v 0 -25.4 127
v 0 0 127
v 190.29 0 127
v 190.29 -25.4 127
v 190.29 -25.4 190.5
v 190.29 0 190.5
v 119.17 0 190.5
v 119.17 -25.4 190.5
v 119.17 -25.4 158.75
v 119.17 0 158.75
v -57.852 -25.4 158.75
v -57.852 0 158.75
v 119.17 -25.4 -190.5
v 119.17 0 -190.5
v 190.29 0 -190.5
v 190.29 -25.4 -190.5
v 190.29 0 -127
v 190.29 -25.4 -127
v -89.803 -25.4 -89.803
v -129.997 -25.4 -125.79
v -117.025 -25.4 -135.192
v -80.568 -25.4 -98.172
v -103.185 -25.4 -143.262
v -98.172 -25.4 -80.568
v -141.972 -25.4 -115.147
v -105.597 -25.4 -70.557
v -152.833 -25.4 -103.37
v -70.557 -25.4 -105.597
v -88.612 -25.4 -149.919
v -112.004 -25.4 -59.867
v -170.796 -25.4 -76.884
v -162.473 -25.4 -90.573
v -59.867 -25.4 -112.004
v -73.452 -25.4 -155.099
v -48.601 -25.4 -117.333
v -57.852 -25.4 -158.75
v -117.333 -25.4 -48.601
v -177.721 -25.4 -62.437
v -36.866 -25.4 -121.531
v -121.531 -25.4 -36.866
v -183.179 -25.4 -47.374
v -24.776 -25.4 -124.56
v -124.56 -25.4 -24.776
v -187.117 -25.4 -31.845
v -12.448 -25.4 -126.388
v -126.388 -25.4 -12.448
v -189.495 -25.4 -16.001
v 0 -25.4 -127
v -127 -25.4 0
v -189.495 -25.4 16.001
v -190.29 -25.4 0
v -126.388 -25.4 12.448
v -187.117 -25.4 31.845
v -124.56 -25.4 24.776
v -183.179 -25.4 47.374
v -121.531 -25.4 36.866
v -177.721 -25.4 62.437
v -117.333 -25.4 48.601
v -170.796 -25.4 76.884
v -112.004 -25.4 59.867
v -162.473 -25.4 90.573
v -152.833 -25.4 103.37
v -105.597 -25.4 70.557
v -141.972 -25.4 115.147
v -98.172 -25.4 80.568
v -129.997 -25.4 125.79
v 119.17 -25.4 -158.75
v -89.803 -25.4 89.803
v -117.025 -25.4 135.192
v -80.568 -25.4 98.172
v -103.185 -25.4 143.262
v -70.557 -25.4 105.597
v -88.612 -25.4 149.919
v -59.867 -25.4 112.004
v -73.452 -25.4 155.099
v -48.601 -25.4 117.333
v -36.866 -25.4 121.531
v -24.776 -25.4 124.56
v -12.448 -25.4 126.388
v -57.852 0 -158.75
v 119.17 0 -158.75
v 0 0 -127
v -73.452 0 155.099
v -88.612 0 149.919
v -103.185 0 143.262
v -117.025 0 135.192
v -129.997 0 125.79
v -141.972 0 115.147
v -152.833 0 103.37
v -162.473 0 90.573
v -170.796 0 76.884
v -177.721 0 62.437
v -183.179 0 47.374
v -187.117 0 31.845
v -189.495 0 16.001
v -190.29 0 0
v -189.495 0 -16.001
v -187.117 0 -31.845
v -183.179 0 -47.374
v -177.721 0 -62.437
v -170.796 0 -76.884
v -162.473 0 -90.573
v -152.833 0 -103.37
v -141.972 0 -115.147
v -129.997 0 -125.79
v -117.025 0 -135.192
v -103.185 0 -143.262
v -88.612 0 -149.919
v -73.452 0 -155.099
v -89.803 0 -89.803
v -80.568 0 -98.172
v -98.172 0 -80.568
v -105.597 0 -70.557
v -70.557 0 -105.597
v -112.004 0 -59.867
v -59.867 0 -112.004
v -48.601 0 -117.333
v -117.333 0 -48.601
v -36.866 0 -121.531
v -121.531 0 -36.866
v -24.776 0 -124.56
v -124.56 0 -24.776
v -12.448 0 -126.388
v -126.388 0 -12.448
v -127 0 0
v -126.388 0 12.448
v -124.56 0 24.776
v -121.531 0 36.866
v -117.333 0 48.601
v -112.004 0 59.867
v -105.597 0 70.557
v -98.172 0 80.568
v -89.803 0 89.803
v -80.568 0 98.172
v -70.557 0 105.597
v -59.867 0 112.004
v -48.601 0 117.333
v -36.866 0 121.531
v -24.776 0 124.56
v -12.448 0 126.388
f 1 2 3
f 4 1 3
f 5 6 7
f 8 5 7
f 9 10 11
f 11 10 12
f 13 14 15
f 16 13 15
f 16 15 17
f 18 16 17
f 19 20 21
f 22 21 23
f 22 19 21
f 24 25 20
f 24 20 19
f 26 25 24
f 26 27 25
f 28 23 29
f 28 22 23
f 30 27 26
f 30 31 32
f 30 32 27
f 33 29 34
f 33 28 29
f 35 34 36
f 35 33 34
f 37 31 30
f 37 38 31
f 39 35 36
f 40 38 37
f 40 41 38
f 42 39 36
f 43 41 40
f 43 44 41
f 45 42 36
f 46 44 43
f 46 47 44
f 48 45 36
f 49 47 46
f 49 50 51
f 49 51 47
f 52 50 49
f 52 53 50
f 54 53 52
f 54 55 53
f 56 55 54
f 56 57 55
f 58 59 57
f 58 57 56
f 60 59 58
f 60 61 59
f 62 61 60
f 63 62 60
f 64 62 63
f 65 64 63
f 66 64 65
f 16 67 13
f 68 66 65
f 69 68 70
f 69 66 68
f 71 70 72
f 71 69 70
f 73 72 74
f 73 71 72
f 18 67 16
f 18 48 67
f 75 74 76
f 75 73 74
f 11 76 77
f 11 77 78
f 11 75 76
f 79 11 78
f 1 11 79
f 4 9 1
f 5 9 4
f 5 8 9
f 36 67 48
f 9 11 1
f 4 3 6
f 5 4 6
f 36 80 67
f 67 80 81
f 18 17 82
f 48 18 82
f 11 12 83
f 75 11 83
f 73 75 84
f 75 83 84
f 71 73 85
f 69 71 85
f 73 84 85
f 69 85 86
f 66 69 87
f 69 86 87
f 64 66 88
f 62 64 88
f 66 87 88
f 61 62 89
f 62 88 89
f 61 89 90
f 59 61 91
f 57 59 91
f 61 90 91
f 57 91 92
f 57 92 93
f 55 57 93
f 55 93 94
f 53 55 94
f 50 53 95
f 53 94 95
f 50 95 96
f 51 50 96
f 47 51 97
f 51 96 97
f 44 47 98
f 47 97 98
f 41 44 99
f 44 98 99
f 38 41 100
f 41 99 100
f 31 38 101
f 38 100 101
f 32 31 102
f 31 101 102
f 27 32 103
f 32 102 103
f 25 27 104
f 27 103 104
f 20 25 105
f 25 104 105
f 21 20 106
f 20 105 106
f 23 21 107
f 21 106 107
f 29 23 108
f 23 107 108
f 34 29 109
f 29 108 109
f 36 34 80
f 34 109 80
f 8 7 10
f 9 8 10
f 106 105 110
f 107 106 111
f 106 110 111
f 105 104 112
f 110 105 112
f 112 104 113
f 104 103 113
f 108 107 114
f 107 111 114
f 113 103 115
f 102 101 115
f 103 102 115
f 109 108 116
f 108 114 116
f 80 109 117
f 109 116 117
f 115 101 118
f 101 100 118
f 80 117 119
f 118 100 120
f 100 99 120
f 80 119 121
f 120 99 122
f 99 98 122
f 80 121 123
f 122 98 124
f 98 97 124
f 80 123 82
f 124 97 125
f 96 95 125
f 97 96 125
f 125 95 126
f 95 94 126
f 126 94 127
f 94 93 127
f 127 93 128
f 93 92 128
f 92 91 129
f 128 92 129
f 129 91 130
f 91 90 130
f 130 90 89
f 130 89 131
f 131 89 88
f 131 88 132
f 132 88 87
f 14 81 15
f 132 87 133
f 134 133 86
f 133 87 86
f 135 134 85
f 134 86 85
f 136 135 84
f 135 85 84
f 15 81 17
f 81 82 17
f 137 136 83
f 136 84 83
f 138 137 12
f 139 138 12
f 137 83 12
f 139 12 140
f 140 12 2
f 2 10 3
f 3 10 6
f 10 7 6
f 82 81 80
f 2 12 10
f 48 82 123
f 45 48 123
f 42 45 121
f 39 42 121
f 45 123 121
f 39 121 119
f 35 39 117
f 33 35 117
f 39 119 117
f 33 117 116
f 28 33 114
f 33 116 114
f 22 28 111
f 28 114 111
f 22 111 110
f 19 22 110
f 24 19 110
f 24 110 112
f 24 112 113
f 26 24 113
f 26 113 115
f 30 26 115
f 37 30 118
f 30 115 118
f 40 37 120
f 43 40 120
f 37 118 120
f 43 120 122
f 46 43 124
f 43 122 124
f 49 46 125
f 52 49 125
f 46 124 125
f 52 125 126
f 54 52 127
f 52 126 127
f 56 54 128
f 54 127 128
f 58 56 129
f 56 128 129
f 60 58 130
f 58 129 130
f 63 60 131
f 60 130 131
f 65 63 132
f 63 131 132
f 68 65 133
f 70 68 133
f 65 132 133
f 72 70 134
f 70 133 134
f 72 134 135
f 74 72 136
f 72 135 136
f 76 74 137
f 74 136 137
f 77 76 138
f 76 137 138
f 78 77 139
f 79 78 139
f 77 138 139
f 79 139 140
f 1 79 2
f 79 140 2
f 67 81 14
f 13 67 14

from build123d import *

# Parameters (mm, degrees)
F1_DEPTH = 25.4


with BuildPart() as f1:
    # F0 (on Front) → F1 (new body)
    with BuildSketch(Plane.XZ):
        with BuildLine():
            Line((-57.852422, -158.75), (119.170049, -158.75))
            Line((119.170049, -158.75), (119.170049, -190.5))
            Line((119.170049, -190.5), (190.290049, -190.5))
            Line((190.290049, -190.5), (190.290049, -158.75))
            Line((190.290049, -158.75), (190.290049, -127))
            Line((190.290049, -127), (0, -127))
            ThreePointArc((0, -127), (-127, 0), (0, 127))
            Line((0, 127), (153.091423, 127))
            Line((153.091423, 127), (190.290049, 127))
            Line((190.290049, 127), (190.290049, 158.75))
            Line((190.290049, 158.75), (190.290049, 190.5))
            Line((190.290049, 190.5), (119.170049, 190.5))
            Line((119.170049, 190.5), (119.170049, 158.75))
            Line((119.170049, 158.75), (-57.852422, 158.75))
            ThreePointArc((-57.852422, 158.75), (-190.290049, 0), (-57.852422, -158.75))
        make_face()
    extrude(amount=F1_DEPTH)


solid = f1.part
